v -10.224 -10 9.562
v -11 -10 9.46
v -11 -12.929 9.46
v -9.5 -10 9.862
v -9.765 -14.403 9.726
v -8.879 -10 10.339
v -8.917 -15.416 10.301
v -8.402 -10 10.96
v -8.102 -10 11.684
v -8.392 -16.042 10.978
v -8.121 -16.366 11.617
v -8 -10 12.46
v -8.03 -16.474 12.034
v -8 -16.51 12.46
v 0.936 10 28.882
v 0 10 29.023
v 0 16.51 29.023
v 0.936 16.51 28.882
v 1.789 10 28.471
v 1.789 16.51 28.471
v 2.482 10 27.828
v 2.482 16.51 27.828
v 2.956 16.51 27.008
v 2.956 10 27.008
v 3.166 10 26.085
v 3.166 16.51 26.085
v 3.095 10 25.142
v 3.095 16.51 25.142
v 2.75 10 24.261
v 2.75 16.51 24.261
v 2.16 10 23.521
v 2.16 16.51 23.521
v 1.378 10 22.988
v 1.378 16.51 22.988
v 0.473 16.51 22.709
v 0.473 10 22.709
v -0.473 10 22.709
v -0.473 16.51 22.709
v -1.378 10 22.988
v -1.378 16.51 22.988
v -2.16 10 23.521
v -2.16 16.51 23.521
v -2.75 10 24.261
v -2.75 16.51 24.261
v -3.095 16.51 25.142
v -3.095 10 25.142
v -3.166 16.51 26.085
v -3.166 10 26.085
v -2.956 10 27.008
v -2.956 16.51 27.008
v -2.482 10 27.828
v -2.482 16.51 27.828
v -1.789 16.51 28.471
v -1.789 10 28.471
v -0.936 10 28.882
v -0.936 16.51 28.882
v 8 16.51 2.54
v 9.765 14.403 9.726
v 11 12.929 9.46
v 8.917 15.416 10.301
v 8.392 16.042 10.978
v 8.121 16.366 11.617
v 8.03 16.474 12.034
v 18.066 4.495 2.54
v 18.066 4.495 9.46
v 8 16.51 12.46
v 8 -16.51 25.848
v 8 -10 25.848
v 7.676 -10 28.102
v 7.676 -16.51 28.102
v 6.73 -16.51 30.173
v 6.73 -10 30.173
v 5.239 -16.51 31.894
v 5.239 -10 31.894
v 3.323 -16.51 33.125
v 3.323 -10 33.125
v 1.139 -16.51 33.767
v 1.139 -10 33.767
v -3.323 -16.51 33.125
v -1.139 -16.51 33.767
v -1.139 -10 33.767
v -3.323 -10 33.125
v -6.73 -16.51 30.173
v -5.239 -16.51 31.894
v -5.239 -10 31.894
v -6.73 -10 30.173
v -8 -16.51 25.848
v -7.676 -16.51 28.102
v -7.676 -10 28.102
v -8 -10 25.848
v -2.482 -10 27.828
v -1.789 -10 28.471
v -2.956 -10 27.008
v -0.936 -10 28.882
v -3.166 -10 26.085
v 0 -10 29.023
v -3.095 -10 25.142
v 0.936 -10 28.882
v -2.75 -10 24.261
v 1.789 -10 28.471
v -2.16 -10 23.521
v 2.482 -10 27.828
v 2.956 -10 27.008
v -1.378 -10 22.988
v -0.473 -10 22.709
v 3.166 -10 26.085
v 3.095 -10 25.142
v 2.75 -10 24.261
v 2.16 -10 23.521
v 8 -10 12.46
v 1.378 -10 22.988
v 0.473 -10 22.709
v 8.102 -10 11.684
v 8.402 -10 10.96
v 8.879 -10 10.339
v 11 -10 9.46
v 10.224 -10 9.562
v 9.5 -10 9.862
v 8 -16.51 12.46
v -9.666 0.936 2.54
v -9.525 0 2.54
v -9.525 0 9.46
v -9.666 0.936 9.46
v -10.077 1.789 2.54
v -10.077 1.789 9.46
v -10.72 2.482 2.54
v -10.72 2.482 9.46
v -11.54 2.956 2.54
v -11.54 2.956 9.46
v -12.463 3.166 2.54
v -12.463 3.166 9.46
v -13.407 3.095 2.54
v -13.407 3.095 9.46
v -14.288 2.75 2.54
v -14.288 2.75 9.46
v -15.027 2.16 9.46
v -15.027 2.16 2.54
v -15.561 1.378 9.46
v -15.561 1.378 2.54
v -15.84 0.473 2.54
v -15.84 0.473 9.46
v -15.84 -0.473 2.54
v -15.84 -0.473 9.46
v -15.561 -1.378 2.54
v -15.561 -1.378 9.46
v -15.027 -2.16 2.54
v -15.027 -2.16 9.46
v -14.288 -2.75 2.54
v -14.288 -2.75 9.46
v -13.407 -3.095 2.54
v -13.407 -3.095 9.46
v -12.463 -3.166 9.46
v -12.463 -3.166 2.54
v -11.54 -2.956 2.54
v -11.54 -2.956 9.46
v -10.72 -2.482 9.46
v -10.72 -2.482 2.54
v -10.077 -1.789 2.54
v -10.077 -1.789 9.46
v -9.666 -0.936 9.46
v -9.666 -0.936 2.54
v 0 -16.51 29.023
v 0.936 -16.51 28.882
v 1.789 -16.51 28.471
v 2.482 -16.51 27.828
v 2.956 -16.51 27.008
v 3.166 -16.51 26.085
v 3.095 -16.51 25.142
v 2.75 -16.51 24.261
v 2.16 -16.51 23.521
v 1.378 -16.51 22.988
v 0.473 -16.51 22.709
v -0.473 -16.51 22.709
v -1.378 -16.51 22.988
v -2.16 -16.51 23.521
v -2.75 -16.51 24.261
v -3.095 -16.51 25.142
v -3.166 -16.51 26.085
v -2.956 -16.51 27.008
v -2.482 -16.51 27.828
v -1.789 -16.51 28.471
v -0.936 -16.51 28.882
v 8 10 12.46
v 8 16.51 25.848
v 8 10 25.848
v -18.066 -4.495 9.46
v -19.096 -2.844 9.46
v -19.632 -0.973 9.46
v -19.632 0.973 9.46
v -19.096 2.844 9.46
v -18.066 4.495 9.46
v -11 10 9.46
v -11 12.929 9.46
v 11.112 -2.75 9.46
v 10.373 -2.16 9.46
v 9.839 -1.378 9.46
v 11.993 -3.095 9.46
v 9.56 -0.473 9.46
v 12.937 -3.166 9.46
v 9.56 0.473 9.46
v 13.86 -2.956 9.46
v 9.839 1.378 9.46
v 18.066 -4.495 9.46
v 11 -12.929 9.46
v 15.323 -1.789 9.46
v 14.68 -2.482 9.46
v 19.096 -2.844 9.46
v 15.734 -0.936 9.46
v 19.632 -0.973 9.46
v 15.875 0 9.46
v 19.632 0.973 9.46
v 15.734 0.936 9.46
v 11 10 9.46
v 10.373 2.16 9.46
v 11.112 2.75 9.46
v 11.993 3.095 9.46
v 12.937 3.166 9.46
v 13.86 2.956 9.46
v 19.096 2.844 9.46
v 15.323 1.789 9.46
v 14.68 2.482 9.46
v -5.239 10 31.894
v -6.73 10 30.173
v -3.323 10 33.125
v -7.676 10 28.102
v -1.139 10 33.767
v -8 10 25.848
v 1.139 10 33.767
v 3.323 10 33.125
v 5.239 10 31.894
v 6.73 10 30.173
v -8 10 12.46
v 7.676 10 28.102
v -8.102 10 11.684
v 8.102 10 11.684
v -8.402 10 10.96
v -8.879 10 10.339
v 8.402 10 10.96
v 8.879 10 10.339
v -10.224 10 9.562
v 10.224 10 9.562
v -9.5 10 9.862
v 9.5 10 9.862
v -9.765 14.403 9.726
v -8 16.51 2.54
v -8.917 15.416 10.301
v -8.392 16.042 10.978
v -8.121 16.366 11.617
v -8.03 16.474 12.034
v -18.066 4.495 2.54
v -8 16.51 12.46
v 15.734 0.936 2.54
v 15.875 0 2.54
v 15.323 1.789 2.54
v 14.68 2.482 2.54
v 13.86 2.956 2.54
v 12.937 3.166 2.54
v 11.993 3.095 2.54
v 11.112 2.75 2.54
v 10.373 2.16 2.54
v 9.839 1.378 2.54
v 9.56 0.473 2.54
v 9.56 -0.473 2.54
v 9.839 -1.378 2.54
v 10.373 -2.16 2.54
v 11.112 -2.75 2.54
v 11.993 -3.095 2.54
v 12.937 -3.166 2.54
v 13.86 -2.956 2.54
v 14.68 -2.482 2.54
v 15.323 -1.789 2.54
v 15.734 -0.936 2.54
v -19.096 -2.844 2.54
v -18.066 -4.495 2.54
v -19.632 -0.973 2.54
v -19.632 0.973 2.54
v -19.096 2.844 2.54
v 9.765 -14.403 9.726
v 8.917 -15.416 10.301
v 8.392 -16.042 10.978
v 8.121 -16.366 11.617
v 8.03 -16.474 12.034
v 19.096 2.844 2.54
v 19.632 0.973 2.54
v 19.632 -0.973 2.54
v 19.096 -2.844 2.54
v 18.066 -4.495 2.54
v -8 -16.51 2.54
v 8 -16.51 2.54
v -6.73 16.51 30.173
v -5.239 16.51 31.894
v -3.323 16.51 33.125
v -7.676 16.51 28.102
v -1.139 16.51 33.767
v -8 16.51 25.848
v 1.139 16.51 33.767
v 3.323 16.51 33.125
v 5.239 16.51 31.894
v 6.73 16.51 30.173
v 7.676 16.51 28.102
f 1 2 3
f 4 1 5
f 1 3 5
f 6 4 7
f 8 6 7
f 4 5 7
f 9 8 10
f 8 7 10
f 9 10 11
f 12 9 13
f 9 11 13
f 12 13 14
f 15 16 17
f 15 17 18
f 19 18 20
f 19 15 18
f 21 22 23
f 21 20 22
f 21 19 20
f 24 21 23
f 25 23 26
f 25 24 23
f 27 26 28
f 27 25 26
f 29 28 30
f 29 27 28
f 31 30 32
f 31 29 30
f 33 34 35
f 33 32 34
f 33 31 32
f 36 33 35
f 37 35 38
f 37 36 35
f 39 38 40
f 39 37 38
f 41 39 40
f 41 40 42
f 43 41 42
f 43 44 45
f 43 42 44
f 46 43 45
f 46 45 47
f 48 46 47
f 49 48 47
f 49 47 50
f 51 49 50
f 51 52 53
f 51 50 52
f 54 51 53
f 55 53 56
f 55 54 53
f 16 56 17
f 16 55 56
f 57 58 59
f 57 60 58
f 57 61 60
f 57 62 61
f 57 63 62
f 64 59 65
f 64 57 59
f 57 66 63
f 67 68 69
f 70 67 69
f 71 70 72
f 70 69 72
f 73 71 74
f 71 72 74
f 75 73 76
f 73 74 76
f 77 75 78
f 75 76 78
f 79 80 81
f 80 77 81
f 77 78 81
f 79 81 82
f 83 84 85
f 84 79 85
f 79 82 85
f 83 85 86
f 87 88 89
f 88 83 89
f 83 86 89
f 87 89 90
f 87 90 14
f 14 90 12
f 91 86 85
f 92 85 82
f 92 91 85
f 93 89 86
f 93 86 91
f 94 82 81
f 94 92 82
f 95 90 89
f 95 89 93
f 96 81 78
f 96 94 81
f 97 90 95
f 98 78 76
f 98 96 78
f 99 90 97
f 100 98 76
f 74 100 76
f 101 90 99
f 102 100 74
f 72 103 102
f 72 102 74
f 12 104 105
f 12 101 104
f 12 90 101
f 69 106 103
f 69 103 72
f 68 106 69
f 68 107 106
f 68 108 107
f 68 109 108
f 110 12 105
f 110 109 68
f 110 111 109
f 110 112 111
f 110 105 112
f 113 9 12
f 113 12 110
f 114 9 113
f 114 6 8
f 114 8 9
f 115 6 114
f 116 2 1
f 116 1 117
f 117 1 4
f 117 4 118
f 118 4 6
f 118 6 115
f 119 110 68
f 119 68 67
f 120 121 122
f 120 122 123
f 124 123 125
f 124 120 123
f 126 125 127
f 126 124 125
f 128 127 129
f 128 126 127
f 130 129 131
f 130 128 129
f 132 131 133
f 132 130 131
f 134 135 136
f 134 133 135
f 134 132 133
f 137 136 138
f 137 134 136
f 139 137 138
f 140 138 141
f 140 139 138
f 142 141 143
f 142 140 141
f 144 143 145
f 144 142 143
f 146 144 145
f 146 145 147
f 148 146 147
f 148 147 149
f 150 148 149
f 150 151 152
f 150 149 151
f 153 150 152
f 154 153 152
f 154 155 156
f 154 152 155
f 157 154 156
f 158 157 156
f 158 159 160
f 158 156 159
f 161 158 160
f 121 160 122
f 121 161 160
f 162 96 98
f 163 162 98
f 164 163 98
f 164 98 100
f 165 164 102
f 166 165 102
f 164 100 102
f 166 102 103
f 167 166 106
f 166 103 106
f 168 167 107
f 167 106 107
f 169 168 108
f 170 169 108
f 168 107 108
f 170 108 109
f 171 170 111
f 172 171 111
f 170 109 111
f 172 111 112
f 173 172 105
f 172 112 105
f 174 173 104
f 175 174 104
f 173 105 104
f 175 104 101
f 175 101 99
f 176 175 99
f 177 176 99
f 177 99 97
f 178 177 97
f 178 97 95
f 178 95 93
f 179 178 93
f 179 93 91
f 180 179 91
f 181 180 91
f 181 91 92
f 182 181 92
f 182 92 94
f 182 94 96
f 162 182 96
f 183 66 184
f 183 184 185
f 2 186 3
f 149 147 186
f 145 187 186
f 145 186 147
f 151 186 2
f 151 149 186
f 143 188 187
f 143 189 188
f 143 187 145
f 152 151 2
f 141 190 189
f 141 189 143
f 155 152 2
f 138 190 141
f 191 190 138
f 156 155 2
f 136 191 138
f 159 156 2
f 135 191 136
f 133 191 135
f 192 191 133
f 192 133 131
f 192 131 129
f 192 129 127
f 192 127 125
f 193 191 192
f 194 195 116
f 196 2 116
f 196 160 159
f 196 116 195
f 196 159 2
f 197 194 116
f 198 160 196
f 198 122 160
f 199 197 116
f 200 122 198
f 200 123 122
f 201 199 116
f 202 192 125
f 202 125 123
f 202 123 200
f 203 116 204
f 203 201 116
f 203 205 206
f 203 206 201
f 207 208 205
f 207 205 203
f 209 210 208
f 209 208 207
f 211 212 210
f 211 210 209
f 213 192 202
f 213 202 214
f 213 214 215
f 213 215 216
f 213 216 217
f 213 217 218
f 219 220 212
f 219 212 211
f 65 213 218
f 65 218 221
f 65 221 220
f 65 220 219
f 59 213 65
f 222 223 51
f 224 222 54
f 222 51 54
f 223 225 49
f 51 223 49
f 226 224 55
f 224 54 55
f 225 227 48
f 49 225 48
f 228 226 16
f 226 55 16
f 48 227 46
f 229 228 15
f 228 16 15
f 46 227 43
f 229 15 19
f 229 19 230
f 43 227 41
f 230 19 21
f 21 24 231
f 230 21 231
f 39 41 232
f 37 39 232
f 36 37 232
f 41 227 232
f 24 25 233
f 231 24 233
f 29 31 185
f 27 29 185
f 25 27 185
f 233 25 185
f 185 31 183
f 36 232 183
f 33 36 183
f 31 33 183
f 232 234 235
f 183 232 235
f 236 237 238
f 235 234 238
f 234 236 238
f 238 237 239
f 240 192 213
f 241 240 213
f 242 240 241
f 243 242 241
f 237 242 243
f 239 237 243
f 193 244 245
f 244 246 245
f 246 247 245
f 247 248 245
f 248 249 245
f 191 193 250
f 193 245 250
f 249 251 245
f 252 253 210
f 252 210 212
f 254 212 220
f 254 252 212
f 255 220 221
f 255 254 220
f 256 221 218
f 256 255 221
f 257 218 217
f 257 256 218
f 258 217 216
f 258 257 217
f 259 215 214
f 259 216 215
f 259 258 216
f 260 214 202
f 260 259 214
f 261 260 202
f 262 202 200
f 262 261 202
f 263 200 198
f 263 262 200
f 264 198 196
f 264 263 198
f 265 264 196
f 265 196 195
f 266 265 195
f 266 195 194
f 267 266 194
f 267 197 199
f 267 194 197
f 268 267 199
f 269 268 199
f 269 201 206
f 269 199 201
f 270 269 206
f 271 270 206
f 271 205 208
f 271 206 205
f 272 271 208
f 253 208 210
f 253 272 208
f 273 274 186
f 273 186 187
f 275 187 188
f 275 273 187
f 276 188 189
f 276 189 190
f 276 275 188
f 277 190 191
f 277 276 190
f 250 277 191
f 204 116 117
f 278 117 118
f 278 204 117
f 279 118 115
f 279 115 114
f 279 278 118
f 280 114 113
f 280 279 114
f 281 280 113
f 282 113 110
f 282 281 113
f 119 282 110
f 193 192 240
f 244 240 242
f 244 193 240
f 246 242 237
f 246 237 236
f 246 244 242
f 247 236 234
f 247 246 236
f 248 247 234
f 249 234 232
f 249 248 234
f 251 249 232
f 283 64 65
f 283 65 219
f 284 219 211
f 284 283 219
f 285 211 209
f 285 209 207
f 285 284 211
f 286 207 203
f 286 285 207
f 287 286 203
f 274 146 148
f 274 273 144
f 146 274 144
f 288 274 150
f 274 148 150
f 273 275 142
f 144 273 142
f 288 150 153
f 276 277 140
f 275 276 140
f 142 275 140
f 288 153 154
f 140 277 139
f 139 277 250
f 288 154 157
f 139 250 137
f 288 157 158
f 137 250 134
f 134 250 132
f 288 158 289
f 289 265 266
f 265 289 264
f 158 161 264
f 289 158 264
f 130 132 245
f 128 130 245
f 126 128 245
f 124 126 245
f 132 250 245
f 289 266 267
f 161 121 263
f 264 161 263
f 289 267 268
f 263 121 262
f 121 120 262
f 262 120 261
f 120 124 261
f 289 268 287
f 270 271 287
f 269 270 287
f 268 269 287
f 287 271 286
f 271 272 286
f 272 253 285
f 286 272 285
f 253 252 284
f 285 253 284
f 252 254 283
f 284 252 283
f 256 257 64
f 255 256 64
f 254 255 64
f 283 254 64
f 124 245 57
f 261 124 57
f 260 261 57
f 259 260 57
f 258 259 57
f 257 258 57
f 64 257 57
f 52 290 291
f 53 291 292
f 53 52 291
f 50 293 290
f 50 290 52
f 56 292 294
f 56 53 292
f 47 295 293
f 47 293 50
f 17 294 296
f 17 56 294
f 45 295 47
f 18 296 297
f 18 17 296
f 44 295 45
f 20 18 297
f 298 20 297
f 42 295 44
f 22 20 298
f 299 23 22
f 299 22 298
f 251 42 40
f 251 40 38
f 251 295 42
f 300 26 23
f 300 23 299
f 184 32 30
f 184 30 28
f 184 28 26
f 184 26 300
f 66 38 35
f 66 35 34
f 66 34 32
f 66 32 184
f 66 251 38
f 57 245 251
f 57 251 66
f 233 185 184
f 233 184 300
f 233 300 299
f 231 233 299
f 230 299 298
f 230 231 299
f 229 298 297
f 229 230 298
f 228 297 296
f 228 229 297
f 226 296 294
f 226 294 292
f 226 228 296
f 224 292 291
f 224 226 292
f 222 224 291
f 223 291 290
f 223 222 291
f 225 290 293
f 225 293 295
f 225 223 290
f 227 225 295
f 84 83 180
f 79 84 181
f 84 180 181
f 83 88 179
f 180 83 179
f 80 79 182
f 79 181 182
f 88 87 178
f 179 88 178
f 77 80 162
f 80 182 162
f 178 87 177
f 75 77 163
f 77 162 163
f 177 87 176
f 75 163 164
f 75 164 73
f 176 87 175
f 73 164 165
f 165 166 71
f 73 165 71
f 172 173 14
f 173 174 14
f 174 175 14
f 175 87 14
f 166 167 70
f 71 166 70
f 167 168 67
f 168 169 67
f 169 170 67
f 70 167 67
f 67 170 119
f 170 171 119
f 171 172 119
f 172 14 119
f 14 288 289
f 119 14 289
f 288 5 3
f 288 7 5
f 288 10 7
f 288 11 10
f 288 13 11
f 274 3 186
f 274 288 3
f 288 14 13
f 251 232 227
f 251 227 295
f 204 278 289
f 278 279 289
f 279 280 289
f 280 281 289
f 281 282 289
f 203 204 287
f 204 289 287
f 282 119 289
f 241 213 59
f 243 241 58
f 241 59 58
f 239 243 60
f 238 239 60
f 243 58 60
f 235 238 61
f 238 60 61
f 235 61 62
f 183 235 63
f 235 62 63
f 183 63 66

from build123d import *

# Parameters (mm, degrees)
SKETCH1_W                      = 41.4
SKETCH1_H                      = 33.02
SKETCH1_R                      = 3.175
BOSS_EXTRUDE1_DEPTH            = 9.46
SKETCH2_W                      = 41.4
SKETCH2_H                      = 6.51
BOSS_EXTRUDE2_DEPTH            = 53
CUT_EXTRUDE1_REACH             = 69.84
SKETCH4_R                      = 3.175
CUT_EXTRUDE1_DIRECTION_2_REACH = 69.84
CUT_EXTRUDE3_REACH             = 69.84
CUT_EXTRUDE3_DIRECTION_2_REACH = 69.84
CUT_EXTRUDE4_DEPTH             = 9.46
BOSS_EXTRUDE3_DEPTH            = 9.46
FILLET3_R                      = 3
CUT_EXTRUDE5_DEPTH             = 2.54


with BuildPart() as part:
    # Sketch1 → Boss-Extrude1 (new body)
    with BuildSketch(Plane.XY):
        Rectangle(SKETCH1_W, SKETCH1_H)
        with Locations((12.7, 0)):
            Circle(SKETCH1_R, mode=Mode.SUBTRACT)
        with Locations((-12.7, 0)):
            Circle(SKETCH1_R, mode=Mode.SUBTRACT)
    extrude(amount=BOSS_EXTRUDE1_DEPTH)

    # Sketch2 → Boss-Extrude2 (add)
    with BuildSketch(Plane.XY.offset(9.46)):
        with Locations((0, 13.255)):
            Rectangle(SKETCH2_W, SKETCH2_H)
        with Locations((0, -13.255)):
            Rectangle(SKETCH2_W, SKETCH2_H)
    extrude(amount=BOSS_EXTRUDE2_DEPTH)

    # Cut-Extrude1: up to this face of the body (flat: up to its plane)
    cut_extrude1_end = Plane(part.part.faces().sort_by_distance((0, -16.51, 31.23))[0])
    # Sketch4 → Cut-Extrude1 (cut, up to the picked face)
    with BuildSketch(Plane(origin=(0, 0, 0), x_dir=(1, 0, 0), z_dir=(0, 1, 0)), mode=Mode.PRIVATE) as cut_extrude1_sk1:
        with Locations(Location((0, -25.8481308, 0), (0, 0, 270))):
            Circle(SKETCH4_R)
    cut_extrude1_tool1 = split(extrude(cut_extrude1_sk1.sketch, amount=-CUT_EXTRUDE1_REACH, mode=Mode.PRIVATE), bisect_by=cut_extrude1_end, keep=Keep.BOTH, mode=Mode.PRIVATE)
    add(cut_extrude1_tool1.solids().sort_by(Axis((0, 0, 25.848131), (0, -1, 0)))[0], mode=Mode.SUBTRACT)

    # Cut-Extrude1 direction 2: up to this face of the body (flat: up to its plane)
    cut_extrude1_direction_2_end = Plane(part.part.faces().sort_by_distance((0, 16.51, 31.23))[0])
    # Sketch4 → Cut-Extrude1 direction 2 (cut, up to the picked face)
    with BuildSketch(Plane(origin=(0, 0, 0), x_dir=(1, 0, 0), z_dir=(0, 1, 0)), mode=Mode.PRIVATE) as cut_extrude1_direction_2_sk1:
        with Locations(Location((0, -25.8481308, 0), (0, 0, 270))):
            Circle(SKETCH4_R)
    cut_extrude1_direction_2_tool1 = split(extrude(cut_extrude1_direction_2_sk1.sketch, amount=CUT_EXTRUDE1_DIRECTION_2_REACH, mode=Mode.PRIVATE), bisect_by=cut_extrude1_direction_2_end, keep=Keep.BOTH, mode=Mode.PRIVATE)
    add(cut_extrude1_direction_2_tool1.solids().sort_by(Axis((0, 0, 25.848131), (0, 1, 0)))[0], mode=Mode.SUBTRACT)

    # Cut-Extrude3: up to this face of the body (flat: up to its plane)
    cut_extrude3_end = Plane(part.part.faces().sort_by_distance((0, -16.51, 31.296729805))[0])
    # Sketch6 → Cut-Extrude3 (cut, up to the picked face)
    with BuildSketch(Plane(origin=(0, 0, 0), x_dir=(1, 0, 0), z_dir=(0, 1, 0)), mode=Mode.PRIVATE) as cut_extrude3_sk1:
        with BuildLine():
            Line((-8, -25.8481308), (-8, -17.46))
            Line((-8, -17.46), (-8, -9.46))
            Line((-8, -9.46), (-16, -9.46))
            Line((-16, -9.46), (-20.7, -9.46))
            Line((-20.7, -9.46), (-20.7, -62.46))
            Line((-20.7, -62.46), (20.7, -62.46))
            Line((20.7, -62.46), (20.7, -9.46))
            Line((20.7, -9.46), (16, -9.46))
            Line((16, -9.46), (8, -9.46))
            Line((8, -9.46), (8, -17.46))
            Line((8, -17.46), (8, -25.8481308))
            ThreePointArc((8, -25.8481308), (0, -33.8481308), (-8, -25.8481308))
        make_face()
    cut_extrude3_tool1 = split(extrude(cut_extrude3_sk1.sketch, amount=-CUT_EXTRUDE3_REACH, mode=Mode.PRIVATE), bisect_by=cut_extrude3_end, keep=Keep.BOTH, mode=Mode.PRIVATE)
    add(cut_extrude3_tool1.solids().sort_by(Axis((0, 0, 38.949542), (0, -1, 0)))[0], mode=Mode.SUBTRACT)

    # Cut-Extrude3 direction 2: up to this face of the body (flat: up to its plane)
    cut_extrude3_direction_2_end = Plane(part.part.faces().sort_by_distance((0, 16.51, 31.296729805))[0])
    # Sketch6 → Cut-Extrude3 direction 2 (cut, up to the picked face)
    with BuildSketch(Plane(origin=(0, 0, 0), x_dir=(1, 0, 0), z_dir=(0, 1, 0)), mode=Mode.PRIVATE) as cut_extrude3_direction_2_sk1:
        with BuildLine():
            Line((-8, -25.8481308), (-8, -17.46))
            Line((-8, -17.46), (-8, -9.46))
            Line((-8, -9.46), (-16, -9.46))
            Line((-16, -9.46), (-20.7, -9.46))
            Line((-20.7, -9.46), (-20.7, -62.46))
            Line((-20.7, -62.46), (20.7, -62.46))
            Line((20.7, -62.46), (20.7, -9.46))
            Line((20.7, -9.46), (16, -9.46))
            Line((16, -9.46), (8, -9.46))
            Line((8, -9.46), (8, -17.46))
            Line((8, -17.46), (8, -25.8481308))
            ThreePointArc((8, -25.8481308), (0, -33.8481308), (-8, -25.8481308))
        make_face()
    cut_extrude3_direction_2_tool1 = split(extrude(cut_extrude3_direction_2_sk1.sketch, amount=CUT_EXTRUDE3_DIRECTION_2_REACH, mode=Mode.PRIVATE), bisect_by=cut_extrude3_direction_2_end, keep=Keep.BOTH, mode=Mode.PRIVATE)
    add(cut_extrude3_direction_2_tool1.solids().sort_by(Axis((0, 0, 38.949542), (0, 1, 0)))[0], mode=Mode.SUBTRACT)

    # Sketch7 → Cut-Extrude4 (cut)
    with BuildSketch(Plane.XY):
        with BuildLine():
            ThreePointArc((-12.7, -7), (-19.7, 0), (-12.7, 7))
            Line((-12.7, 7), (-8, 7))
            Line((-8, 7), (-8, 16.51))
            Line((-8, 16.51), (-20.7, 16.51))
            Line((-20.7, 16.51), (-20.7, -16.51))
            Line((-20.7, -16.51), (-8, -16.51))
            Line((-8, -16.51), (-8, -7))
            Line((-8, -7), (-12.7, -7))
        make_face()
        with BuildLine():
            Line((8, 16.51), (8, 7))
            Line((8, 7), (12.7, 7))
            ThreePointArc((12.7, 7), (19.7, 0), (12.7, -7))
            Line((12.7, -7), (8, -7))
            Line((8, -7), (8, -16.51))
            Line((8, -16.51), (20.7, -16.51))
            Line((20.7, -16.51), (20.7, 16.51))
            Line((20.7, 16.51), (8, 16.51))
        make_face()
    extrude(amount=CUT_EXTRUDE4_DEPTH, mode=Mode.SUBTRACT)

    # Sketch8 → Boss-Extrude3 (add)
    with BuildSketch(Plane.XY):
        with BuildLine():
            Line((8, -16.51), (18.065759147, -4.495400847))
            ThreePointArc((18.065759147, -4.495400847), (15.660759537, -6.343020019), (12.7, -7))
            Line((12.7, -7), (8, -7))
            Line((8, -7), (8, -16.51))
        make_face()
        with BuildLine():
            ThreePointArc((-18.065759147, -4.495400847), (-15.660759537, -6.343020019), (-12.7, -7))
            Line((-12.7, -7), (-8, -7))
            Line((-8, -7), (-8, -16.51))
            Line((-8, -16.51), (-18.065759147, -4.495400847))
        make_face()
        with BuildLine():
            Line((8, 16.51), (18.065759147, 4.495400847))
            ThreePointArc((18.065759147, 4.495400847), (15.660759537, 6.343020019), (12.7, 7))
            Line((12.7, 7), (8, 7))
            Line((8, 7), (8, 16.51))
        make_face()
        with BuildLine():
            Line((-8, 16.51), (-18.065759147, 4.495400847))
            ThreePointArc((-18.065759147, 4.495400847), (-15.660759537, 6.343020019), (-12.7, 7))
            Line((-12.7, 7), (-8, 7))
            Line((-8, 7), (-8, 16.51))
        make_face()
    extrude(amount=BOSS_EXTRUDE3_DEPTH)

    # Fillet3
    fillet3_edges = [part.edges().sort_by_distance(p)[0] for p in [
        (8, -13.255, 9.46),
        (-8, -13.255, 9.46),
        (8, 13.255, 9.46),
        (-8, 13.255, 9.46),
    ]]
    fillet(fillet3_edges, radius=FILLET3_R)

    # Sketch10 → Cut-Extrude5 (cut)
    with BuildSketch(Plane.XY):
        with BuildLine():
            Line((-8, 16.51), (-18.065759147, 4.495400847))
            ThreePointArc((-18.065759147, 4.495400847), (-19.7, 0), (-18.065759147, -4.495400847))
            Line((-18.065759147, -4.495400847), (-8, -16.51))
            Line((-8, -16.51), (8, -16.51))
            Line((8, -16.51), (18.065759147, -4.495400847))
            ThreePointArc((18.065759147, -4.495400847), (19.7, 0), (18.065759147, 4.495400847))
            Line((18.065759147, 4.495400847), (8, 16.51))
            Line((8, 16.51), (-8, 16.51))
        make_face()
    extrude(amount=CUT_EXTRUDE5_DEPTH, mode=Mode.SUBTRACT)


solid = part.part
